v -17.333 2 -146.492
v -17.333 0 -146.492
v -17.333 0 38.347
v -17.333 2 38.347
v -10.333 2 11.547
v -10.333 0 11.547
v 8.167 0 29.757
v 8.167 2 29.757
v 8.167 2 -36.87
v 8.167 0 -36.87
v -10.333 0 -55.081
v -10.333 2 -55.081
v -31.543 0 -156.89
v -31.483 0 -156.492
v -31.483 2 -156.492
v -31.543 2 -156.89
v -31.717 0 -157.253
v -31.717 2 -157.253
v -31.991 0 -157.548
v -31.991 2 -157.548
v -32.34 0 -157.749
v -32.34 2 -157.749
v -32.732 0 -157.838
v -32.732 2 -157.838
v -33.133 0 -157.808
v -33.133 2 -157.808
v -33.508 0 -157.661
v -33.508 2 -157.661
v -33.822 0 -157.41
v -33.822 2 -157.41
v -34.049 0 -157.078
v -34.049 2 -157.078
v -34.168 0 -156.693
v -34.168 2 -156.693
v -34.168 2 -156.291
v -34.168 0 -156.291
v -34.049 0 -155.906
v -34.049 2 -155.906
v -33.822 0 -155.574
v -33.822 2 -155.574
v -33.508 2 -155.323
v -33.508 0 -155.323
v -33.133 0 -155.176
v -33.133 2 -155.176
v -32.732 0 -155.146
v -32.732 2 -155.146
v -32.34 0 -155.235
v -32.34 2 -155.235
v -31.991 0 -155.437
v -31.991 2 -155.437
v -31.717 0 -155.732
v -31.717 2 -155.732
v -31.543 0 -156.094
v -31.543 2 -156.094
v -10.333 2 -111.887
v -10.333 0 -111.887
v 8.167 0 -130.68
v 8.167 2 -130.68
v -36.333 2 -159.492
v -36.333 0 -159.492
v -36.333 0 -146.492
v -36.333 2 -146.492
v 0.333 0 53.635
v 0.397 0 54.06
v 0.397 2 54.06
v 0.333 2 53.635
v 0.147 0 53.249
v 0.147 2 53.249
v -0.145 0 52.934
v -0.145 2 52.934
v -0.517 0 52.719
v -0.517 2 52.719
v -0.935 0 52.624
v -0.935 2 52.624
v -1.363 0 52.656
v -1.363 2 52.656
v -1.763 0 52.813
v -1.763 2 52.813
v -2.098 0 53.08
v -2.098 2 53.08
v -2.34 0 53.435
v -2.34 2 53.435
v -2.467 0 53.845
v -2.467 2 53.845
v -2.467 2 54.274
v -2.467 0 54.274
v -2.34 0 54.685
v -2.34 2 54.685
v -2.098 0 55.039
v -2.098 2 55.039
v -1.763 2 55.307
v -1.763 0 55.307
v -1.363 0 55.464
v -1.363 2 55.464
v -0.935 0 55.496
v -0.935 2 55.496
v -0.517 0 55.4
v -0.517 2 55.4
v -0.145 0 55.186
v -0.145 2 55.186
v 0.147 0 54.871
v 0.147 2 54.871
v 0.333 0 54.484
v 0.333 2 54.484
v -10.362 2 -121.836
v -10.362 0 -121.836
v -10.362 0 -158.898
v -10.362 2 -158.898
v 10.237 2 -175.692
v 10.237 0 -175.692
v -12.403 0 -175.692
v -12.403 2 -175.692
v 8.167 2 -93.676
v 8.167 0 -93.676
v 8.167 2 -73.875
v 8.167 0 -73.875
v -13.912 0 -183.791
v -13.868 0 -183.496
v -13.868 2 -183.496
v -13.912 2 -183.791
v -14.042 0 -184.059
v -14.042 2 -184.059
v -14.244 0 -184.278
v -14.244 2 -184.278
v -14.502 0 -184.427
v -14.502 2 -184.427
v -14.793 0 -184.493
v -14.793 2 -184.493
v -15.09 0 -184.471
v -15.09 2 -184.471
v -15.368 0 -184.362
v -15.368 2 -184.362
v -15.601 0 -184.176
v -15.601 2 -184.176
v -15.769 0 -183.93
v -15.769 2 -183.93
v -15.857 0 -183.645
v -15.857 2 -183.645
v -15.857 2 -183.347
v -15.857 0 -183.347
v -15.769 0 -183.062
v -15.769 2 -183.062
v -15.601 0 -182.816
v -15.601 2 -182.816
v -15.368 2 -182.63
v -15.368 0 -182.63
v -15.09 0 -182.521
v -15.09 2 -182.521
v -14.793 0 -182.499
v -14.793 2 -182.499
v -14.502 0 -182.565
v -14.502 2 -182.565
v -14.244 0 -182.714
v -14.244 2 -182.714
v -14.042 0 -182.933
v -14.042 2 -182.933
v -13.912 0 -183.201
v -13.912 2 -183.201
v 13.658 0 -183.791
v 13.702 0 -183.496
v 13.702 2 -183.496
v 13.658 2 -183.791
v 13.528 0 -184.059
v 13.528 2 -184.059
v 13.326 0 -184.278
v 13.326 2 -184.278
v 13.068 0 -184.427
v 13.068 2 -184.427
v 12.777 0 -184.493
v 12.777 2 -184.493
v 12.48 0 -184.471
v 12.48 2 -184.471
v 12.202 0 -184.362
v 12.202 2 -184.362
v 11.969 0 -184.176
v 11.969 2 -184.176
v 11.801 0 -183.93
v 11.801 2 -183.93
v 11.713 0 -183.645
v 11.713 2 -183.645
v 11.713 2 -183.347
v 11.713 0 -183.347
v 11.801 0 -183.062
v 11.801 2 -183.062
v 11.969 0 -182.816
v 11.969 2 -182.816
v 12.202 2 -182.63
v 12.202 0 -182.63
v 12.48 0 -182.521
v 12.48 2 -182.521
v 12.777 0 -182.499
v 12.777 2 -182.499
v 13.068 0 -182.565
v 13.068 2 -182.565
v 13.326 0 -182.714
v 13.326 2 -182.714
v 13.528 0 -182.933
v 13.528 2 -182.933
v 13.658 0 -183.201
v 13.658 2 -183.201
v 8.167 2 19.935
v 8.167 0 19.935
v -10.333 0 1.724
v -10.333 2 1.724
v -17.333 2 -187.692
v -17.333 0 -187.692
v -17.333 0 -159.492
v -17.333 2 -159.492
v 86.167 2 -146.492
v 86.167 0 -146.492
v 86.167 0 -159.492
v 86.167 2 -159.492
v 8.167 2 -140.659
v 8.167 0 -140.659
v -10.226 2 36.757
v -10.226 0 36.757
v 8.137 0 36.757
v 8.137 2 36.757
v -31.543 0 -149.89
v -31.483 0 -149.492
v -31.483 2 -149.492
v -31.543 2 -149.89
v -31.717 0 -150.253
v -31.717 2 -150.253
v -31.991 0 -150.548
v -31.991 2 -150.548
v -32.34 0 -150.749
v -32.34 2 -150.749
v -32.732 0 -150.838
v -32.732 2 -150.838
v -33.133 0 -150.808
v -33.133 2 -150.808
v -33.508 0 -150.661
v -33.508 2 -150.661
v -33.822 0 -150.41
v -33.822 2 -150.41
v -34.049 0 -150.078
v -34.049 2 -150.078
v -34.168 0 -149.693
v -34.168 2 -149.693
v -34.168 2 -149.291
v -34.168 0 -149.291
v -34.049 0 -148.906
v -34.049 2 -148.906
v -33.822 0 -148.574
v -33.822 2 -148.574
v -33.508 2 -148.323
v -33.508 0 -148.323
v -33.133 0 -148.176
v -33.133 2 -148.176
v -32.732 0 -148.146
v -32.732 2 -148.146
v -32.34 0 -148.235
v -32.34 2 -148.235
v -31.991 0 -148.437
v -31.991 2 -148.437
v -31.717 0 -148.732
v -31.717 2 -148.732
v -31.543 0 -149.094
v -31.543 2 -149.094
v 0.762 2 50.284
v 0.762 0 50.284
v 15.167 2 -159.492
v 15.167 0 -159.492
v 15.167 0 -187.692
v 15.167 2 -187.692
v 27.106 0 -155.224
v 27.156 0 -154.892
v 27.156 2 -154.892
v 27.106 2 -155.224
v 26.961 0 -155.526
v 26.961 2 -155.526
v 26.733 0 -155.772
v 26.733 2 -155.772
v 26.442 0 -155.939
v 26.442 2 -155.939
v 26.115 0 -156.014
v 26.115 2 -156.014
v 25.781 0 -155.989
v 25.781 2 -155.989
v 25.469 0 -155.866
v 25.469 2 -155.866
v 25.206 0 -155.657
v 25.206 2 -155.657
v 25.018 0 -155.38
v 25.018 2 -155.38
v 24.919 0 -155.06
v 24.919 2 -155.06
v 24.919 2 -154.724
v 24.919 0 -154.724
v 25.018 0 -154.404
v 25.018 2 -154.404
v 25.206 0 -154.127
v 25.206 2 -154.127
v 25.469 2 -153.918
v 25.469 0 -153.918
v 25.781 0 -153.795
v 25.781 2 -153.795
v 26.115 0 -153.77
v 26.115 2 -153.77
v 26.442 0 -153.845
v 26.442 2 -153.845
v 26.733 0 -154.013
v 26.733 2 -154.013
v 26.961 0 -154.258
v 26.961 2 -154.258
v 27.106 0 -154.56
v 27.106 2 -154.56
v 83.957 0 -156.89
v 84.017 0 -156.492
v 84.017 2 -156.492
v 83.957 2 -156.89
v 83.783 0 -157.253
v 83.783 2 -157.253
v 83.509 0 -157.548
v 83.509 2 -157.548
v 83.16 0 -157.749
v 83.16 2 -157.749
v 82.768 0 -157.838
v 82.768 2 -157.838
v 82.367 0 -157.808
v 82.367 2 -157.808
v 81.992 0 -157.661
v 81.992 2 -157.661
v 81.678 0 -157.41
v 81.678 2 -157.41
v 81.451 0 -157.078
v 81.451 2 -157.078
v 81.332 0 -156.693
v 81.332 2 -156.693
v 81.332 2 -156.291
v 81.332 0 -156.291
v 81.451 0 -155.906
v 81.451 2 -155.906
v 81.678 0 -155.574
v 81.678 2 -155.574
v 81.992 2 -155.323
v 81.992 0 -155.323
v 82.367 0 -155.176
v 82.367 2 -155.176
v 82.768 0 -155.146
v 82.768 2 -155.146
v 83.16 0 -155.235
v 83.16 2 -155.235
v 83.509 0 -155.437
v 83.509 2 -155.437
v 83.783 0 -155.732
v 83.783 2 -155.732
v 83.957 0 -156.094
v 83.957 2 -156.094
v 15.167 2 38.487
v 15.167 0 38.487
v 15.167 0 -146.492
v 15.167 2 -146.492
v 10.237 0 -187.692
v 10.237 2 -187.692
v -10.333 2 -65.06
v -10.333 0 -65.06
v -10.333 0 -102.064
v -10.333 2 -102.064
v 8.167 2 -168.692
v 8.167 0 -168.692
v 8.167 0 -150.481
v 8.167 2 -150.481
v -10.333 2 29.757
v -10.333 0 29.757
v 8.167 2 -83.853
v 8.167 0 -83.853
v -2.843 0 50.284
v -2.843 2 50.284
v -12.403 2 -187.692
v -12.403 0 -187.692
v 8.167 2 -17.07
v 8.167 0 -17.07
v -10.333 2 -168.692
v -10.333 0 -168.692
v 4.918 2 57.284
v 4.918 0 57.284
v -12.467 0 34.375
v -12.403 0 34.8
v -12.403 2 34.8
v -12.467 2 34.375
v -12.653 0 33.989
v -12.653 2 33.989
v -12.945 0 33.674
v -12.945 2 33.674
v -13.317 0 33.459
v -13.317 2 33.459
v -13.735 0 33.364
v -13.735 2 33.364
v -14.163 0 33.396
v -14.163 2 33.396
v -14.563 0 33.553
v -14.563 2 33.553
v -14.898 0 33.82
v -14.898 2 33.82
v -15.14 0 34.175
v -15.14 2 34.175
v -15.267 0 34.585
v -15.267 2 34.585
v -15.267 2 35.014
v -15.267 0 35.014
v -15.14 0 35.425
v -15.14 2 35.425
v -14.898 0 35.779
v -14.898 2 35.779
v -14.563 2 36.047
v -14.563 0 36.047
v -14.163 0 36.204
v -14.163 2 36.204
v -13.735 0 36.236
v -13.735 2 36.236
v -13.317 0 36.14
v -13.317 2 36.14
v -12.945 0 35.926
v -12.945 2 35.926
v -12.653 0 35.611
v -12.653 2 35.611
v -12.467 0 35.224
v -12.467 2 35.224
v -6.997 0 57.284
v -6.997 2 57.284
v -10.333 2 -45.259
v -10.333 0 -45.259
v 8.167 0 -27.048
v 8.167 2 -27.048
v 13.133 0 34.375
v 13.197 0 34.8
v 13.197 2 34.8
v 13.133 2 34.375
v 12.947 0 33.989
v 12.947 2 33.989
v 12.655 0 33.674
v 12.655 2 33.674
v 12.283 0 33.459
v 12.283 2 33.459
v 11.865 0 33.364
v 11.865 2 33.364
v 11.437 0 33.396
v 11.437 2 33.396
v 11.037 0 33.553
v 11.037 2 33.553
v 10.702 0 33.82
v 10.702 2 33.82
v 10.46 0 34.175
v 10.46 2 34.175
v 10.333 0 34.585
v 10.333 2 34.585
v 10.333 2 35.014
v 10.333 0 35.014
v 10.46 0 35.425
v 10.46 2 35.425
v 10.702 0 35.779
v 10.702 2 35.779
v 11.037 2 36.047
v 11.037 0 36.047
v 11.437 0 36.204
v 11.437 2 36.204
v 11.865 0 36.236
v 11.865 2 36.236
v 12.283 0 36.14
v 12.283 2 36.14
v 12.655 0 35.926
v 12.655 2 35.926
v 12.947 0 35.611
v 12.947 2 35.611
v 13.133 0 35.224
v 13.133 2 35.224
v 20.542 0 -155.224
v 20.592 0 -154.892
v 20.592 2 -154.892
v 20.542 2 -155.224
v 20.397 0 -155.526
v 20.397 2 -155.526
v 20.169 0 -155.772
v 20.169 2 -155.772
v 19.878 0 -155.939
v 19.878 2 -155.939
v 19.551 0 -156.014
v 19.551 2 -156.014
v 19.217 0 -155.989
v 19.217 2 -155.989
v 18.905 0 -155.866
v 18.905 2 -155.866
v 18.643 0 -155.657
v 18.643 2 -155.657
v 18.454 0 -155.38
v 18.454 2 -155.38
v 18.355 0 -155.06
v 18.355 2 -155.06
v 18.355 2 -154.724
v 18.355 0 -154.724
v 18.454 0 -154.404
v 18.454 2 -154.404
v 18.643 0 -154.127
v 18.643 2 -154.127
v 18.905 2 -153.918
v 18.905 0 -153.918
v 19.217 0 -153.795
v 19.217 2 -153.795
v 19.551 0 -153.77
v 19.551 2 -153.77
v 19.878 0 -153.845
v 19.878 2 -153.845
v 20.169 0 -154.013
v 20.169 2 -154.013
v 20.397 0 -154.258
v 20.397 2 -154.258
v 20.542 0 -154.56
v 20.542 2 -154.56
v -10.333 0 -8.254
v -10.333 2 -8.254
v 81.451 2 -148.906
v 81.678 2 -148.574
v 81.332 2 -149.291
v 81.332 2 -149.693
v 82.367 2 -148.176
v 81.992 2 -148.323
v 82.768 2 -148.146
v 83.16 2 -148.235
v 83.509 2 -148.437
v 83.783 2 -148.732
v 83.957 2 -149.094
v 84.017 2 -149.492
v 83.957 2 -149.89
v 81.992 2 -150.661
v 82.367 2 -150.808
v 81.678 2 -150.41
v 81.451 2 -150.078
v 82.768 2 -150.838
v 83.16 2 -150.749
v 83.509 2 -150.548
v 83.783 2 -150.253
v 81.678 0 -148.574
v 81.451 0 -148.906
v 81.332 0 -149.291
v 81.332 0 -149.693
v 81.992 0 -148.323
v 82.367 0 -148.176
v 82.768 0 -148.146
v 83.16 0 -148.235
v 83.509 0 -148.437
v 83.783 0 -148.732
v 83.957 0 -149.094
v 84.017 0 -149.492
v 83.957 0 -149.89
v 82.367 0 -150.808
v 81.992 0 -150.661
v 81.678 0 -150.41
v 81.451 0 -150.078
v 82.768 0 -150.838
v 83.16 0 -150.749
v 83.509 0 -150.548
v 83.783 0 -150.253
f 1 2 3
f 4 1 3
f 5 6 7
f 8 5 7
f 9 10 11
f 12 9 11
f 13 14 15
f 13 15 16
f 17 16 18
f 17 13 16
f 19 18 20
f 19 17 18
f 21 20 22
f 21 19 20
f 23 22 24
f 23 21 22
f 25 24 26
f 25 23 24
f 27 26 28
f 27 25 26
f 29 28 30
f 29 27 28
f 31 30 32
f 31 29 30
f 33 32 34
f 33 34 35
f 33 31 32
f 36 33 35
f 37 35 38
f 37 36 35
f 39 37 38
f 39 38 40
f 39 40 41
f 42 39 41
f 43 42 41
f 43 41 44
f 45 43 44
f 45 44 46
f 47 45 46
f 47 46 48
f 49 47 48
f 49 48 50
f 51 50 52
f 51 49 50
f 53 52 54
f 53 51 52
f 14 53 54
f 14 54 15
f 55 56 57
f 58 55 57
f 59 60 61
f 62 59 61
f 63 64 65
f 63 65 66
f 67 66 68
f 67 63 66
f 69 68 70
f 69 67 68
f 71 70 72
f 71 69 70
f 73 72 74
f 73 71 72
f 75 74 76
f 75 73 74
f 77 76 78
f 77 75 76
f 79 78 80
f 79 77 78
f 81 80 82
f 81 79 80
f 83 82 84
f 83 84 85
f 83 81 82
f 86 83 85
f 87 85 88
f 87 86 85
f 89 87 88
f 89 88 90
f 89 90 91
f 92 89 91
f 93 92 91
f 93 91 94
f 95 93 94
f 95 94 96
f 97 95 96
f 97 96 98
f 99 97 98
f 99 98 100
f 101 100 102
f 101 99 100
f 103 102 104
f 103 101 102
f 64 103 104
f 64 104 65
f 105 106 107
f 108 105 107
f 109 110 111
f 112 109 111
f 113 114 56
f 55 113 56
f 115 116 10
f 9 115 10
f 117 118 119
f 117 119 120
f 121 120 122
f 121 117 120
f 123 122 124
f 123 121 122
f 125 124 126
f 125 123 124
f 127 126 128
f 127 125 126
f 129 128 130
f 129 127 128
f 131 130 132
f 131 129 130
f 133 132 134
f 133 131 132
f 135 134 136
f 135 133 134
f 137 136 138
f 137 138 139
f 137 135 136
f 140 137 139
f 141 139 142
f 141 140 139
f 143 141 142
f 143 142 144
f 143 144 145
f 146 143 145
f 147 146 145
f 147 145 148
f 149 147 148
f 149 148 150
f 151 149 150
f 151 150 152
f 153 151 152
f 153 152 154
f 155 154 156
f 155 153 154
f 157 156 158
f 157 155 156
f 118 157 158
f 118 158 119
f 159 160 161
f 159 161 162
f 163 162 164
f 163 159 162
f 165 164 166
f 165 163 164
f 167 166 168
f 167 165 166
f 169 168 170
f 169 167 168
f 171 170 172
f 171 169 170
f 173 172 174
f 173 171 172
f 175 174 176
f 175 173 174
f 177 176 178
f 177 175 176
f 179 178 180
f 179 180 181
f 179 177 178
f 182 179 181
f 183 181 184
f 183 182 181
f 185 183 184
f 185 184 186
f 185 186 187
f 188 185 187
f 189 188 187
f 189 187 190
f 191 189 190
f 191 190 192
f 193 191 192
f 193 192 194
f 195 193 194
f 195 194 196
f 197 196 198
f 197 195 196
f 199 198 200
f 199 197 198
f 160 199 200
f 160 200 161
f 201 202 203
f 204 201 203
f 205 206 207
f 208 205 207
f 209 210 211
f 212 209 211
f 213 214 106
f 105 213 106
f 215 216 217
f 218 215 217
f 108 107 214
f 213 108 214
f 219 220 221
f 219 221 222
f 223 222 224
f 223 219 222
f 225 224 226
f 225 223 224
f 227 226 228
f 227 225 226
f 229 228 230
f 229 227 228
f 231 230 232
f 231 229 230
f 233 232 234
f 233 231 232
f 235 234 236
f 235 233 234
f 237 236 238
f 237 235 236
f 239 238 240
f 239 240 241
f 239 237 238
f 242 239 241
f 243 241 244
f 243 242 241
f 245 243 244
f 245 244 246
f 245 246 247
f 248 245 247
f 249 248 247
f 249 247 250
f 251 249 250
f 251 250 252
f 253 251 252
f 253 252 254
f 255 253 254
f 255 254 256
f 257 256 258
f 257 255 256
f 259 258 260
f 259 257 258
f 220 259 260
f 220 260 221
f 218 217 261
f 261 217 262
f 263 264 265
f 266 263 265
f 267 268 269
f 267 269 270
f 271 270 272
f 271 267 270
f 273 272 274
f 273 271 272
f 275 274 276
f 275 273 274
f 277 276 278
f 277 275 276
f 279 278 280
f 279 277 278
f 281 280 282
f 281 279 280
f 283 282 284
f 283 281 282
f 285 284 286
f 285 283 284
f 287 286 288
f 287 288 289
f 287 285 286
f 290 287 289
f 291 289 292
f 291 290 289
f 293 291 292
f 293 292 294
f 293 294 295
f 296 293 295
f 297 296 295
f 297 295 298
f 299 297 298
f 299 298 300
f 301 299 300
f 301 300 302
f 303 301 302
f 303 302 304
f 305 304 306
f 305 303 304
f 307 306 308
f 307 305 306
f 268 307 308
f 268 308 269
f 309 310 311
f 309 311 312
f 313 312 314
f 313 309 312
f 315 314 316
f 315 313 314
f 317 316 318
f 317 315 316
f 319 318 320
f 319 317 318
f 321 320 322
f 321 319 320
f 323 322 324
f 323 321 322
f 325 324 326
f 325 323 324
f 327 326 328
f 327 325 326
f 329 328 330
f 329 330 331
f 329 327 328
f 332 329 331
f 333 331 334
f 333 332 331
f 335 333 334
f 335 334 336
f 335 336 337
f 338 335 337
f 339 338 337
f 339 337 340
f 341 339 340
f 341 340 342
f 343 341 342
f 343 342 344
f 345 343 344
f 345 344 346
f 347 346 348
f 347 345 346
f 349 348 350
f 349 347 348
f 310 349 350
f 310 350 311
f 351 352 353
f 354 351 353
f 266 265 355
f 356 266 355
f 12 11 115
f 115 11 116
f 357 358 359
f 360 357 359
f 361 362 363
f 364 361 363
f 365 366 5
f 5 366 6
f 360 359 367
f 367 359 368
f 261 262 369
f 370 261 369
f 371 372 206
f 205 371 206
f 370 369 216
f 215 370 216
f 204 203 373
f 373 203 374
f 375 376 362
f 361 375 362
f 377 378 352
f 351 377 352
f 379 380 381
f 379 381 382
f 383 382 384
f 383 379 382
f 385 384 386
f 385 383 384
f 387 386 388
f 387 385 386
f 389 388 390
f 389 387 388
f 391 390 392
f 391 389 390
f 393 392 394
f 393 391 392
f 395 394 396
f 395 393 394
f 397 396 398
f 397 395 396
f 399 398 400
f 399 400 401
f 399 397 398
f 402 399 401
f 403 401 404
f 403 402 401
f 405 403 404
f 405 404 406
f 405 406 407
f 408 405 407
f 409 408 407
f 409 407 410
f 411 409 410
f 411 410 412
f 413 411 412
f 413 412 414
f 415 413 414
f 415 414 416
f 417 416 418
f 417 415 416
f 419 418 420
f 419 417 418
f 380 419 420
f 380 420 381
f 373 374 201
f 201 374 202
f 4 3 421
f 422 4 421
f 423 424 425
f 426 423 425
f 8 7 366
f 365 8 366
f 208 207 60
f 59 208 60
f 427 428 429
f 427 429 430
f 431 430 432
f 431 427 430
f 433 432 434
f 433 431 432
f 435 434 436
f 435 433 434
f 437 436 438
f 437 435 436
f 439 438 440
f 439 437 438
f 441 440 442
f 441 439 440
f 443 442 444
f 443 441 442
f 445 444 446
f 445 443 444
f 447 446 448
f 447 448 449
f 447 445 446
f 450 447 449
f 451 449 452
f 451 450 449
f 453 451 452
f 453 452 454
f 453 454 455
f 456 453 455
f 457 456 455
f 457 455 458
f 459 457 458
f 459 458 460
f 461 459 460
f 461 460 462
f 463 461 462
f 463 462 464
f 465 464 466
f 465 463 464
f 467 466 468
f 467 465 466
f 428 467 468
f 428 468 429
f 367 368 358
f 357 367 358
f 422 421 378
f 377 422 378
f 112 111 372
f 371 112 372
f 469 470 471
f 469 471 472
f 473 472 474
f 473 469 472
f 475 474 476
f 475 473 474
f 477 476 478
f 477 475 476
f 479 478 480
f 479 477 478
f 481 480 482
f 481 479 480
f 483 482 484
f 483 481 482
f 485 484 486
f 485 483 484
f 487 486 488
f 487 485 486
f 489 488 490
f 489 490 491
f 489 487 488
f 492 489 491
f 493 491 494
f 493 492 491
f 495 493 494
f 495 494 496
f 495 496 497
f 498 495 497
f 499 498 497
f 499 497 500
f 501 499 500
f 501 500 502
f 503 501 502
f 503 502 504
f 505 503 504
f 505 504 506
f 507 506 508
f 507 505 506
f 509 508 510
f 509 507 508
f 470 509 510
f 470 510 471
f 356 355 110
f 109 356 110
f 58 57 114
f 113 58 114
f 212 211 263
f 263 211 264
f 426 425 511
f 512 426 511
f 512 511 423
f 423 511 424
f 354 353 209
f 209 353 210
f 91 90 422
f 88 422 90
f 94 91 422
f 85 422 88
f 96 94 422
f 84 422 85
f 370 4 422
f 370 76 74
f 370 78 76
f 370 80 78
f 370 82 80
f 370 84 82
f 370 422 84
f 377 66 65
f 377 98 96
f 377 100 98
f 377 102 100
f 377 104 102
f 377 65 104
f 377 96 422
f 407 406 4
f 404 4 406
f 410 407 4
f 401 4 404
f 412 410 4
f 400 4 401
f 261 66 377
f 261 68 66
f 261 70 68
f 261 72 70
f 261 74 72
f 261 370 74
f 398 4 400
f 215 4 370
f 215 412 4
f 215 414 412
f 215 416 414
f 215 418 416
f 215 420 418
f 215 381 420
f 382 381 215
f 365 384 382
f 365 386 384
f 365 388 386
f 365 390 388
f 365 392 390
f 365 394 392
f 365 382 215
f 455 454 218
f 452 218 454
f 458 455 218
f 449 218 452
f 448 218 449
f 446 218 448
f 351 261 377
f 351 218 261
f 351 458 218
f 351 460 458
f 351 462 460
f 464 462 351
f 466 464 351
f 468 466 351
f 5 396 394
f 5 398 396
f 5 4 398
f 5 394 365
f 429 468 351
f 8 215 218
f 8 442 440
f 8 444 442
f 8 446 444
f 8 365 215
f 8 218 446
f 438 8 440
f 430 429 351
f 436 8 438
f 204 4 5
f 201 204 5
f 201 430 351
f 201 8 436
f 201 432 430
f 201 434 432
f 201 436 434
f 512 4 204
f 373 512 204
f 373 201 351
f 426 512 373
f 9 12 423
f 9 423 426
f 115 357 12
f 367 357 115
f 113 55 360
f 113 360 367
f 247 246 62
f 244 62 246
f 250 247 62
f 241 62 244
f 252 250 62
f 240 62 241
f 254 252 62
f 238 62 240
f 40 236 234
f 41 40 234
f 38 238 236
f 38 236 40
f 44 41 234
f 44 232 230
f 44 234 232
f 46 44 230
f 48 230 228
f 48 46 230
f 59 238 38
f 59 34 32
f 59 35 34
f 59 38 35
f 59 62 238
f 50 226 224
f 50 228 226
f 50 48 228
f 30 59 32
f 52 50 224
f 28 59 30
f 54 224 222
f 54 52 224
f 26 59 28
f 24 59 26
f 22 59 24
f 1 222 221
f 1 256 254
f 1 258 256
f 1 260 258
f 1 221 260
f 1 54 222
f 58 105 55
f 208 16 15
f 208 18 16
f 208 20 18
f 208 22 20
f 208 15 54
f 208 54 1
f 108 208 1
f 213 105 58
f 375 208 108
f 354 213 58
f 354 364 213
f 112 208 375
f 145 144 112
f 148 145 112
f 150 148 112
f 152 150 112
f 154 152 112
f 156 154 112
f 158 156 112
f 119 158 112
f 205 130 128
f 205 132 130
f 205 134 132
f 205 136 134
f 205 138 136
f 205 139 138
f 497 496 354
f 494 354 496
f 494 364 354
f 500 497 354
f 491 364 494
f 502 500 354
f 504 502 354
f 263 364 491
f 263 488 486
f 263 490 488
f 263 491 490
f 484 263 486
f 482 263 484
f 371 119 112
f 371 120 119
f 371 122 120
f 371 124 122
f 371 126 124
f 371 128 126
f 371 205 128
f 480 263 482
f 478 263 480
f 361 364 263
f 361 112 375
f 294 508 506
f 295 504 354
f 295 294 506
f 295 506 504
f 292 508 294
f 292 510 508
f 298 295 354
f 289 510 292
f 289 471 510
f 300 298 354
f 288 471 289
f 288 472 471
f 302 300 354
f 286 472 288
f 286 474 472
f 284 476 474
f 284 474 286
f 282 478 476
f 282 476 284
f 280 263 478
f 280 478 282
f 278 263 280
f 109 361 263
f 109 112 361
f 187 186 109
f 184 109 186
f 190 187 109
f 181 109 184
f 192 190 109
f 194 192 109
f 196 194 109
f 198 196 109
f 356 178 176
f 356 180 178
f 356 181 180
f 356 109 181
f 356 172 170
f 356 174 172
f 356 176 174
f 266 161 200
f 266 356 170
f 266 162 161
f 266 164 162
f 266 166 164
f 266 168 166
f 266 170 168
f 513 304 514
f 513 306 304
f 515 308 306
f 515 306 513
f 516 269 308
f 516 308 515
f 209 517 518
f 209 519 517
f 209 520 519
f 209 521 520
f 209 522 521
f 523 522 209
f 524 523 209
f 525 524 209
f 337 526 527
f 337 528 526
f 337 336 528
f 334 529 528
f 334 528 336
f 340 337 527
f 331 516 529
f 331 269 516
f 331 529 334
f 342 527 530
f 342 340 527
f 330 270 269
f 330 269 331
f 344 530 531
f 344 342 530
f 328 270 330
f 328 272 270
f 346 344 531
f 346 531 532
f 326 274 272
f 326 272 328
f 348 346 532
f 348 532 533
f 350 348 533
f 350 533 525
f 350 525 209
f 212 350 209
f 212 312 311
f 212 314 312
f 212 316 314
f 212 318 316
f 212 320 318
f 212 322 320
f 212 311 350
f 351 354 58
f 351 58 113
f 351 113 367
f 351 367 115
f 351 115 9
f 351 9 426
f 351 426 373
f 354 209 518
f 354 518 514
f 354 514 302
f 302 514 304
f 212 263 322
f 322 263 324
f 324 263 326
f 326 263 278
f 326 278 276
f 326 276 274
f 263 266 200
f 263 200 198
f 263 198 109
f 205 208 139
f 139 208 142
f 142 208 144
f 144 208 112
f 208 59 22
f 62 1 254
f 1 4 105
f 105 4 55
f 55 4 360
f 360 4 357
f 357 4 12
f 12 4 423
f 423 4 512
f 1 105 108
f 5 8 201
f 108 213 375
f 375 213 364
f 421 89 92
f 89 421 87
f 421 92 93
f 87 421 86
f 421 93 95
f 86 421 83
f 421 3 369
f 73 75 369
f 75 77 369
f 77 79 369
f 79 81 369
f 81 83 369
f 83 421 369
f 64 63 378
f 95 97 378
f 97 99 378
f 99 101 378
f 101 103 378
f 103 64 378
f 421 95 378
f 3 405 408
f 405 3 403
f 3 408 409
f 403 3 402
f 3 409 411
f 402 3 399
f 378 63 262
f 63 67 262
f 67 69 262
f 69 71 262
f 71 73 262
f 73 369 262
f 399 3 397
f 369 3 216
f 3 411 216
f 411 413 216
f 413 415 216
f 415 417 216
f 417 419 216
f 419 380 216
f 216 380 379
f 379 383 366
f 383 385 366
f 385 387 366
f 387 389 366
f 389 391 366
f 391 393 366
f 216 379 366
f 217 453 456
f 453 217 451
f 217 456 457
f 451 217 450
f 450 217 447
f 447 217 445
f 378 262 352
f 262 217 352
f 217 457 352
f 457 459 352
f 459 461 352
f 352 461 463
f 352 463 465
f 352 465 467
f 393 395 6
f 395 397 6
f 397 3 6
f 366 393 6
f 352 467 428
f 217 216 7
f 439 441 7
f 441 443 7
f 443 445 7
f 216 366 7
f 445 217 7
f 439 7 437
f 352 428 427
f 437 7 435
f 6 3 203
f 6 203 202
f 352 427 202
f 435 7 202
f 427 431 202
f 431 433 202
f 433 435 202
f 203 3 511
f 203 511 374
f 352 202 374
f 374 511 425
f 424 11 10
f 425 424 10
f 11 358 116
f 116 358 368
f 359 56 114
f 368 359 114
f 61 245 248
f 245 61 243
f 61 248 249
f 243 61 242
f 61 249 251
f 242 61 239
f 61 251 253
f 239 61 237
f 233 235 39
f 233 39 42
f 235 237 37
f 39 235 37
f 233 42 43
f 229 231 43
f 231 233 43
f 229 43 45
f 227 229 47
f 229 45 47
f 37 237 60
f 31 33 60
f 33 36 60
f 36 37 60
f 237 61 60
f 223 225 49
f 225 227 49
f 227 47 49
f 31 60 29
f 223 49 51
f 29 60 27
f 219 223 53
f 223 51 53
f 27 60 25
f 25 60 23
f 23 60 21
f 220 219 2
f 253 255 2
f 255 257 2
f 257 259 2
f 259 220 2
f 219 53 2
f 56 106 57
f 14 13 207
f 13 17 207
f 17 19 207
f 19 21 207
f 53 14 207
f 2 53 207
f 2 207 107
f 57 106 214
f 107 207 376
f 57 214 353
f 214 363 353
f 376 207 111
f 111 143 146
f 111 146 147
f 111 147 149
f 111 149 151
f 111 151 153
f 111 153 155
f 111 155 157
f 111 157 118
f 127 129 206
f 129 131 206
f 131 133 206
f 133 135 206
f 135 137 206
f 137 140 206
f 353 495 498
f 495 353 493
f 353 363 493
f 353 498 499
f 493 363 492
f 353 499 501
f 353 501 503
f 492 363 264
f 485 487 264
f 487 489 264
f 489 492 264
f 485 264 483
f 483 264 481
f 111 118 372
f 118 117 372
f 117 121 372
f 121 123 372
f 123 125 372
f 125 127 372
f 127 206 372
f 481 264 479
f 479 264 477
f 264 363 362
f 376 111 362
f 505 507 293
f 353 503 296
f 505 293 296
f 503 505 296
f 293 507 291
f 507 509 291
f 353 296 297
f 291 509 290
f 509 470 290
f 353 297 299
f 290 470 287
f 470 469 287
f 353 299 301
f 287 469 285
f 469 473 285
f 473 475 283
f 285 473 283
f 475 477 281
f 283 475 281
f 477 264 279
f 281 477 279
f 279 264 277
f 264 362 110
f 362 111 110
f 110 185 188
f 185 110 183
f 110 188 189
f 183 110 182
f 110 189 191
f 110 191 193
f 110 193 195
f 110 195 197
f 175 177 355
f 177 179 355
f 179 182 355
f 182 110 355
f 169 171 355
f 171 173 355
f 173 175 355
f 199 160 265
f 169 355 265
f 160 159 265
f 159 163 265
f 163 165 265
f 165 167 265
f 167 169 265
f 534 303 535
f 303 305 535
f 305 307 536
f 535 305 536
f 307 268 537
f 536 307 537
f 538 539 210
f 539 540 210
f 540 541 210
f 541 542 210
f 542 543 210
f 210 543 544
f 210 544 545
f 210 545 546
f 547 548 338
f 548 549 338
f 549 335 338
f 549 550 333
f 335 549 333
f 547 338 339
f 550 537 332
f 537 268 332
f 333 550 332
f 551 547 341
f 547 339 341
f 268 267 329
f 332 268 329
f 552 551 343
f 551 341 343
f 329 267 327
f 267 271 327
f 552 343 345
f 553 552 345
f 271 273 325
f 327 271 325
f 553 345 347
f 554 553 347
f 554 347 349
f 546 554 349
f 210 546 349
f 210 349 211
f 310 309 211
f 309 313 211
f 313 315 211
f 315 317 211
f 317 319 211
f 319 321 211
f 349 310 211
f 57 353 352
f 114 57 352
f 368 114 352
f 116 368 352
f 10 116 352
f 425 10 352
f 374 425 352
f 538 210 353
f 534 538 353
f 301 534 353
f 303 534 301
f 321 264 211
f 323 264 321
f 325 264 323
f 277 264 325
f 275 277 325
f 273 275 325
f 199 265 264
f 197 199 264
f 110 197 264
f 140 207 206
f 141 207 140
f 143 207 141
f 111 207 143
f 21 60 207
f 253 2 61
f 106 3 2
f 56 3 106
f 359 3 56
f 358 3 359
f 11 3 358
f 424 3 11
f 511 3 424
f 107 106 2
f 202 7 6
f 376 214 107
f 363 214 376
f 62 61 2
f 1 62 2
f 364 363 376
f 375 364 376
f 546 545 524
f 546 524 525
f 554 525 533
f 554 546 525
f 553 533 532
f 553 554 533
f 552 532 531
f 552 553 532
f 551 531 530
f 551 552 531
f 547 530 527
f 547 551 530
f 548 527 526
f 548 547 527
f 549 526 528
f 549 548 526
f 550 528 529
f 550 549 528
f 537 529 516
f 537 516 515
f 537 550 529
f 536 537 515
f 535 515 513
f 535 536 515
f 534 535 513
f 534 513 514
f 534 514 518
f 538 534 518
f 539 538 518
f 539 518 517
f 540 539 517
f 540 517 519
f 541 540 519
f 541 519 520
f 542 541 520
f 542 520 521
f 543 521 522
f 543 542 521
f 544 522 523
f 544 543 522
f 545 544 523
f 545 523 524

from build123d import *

# Parameters (mm, degrees)
SKETCH1_R           = 1.44
SKETCH1_R_2         = 1.35
SKETCH1_R_3         = 1
SKETCH1_R_4         = 1.125
BOSS_EXTRUDE1_DEPTH = 2


with BuildPart() as part:
    # Sketch1 → Boss-Extrude1 (new body)
    with BuildSketch(Plane(origin=(0, 0, 0), x_dir=(1, 0, 0), z_dir=(0, 1, 0))):
        Polygon((-17.332807681, 117.69771489), (-17.332807681, -38.346866508), (-6.997005855, -57.284094596), (4.918028523, -57.284094596), (15.167192319, -38.486712582), (15.167192319, 146.492065716), (86.167192319, 146.492065716), (86.167192319, 159.492065716), (15.167192319, 159.492065716), (15.167192319, 187.692065716), (10.237192319, 187.692065716), (10.237192319, 175.692065716), (-12.402807681, 175.692065716), (-12.402807681, 187.692065716), (-17.332807681, 187.692065716), (-17.332807681, 159.492065716), (-36.332807681, 159.492065716), (-36.332807681, 146.492065716), (-17.332807681, 146.492065716), align=None)
        with Locations((-13.842807681, -34.799722329)):
            Circle(SKETCH1_R, mode=Mode.SUBTRACT)
        with Locations((-1.042807681, -54.059722329)):
            Circle(SKETCH1_R, mode=Mode.SUBTRACT)
        Polygon((-2.842807681, -50.284094596), (-10.225590468, -36.757379986), (8.137192319, -36.757379986), (0.761829434, -50.284094596), align=None, mode=Mode.SUBTRACT)
        with Locations((11.757192319, -34.799722329)):
            Circle(SKETCH1_R, mode=Mode.SUBTRACT)
        Polygon((8.167192319, -29.757379986), (-10.332807681, -29.757379986), (-10.332807681, -11.546628322), align=None, mode=Mode.SUBTRACT)
        Polygon((8.167192319, -19.934969699), (-10.332807681, -1.724218034), (8.167192319, 17.069624543), align=None, mode=Mode.SUBTRACT)
        Polygon((8.167192319, 27.048047931), (-10.332807681, 8.254205353), (-10.332807681, 45.258799595), align=None, mode=Mode.SUBTRACT)
        Polygon((8.167192319, 36.870458218), (-10.332807681, 55.081209882), (8.167192319, 73.87505246), align=None, mode=Mode.SUBTRACT)
        Polygon((8.167192319, 83.853475847), (-10.332807681, 65.05963327), (-10.332807681, 102.064227512), align=None, mode=Mode.SUBTRACT)
        Polygon((8.167192319, 93.675886135), (-10.332807681, 111.886637799), (8.167192319, 130.680480377), align=None, mode=Mode.SUBTRACT)
        with Locations((-32.832807681, 149.492065716)):
            Circle(SKETCH1_R_2, mode=Mode.SUBTRACT)
        with Locations((-32.832807681, 156.492065716)):
            Circle(SKETCH1_R_2, mode=Mode.SUBTRACT)
        with Locations((-14.867807681, 183.496000094)):
            Circle(SKETCH1_R_3, mode=Mode.SUBTRACT)
        Polygon((8.167192319, 140.658903764), (-10.361742255, 121.835667033), (-10.361742255, 158.89813761), align=None, mode=Mode.SUBTRACT)
        with Locations((19.467192319, 154.892065716)):
            Circle(SKETCH1_R_4, mode=Mode.SUBTRACT)
        Polygon((8.167192319, 150.481314052), (-10.332807681, 168.692065716), (8.167192319, 168.692065716), align=None, mode=Mode.SUBTRACT)
        with Locations((12.702192319, 183.496000094)):
            Circle(SKETCH1_R_3, mode=Mode.SUBTRACT)
        with Locations((26.031178731, 154.892065716)):
            Circle(SKETCH1_R_4, mode=Mode.SUBTRACT)
        with Locations((82.667192319, 149.492065716)):
            Circle(SKETCH1_R_2, mode=Mode.SUBTRACT)
        with Locations((82.667192319, 156.492065716)):
            Circle(SKETCH1_R_2, mode=Mode.SUBTRACT)
    extrude(amount=BOSS_EXTRUDE1_DEPTH)


solid = part.part
